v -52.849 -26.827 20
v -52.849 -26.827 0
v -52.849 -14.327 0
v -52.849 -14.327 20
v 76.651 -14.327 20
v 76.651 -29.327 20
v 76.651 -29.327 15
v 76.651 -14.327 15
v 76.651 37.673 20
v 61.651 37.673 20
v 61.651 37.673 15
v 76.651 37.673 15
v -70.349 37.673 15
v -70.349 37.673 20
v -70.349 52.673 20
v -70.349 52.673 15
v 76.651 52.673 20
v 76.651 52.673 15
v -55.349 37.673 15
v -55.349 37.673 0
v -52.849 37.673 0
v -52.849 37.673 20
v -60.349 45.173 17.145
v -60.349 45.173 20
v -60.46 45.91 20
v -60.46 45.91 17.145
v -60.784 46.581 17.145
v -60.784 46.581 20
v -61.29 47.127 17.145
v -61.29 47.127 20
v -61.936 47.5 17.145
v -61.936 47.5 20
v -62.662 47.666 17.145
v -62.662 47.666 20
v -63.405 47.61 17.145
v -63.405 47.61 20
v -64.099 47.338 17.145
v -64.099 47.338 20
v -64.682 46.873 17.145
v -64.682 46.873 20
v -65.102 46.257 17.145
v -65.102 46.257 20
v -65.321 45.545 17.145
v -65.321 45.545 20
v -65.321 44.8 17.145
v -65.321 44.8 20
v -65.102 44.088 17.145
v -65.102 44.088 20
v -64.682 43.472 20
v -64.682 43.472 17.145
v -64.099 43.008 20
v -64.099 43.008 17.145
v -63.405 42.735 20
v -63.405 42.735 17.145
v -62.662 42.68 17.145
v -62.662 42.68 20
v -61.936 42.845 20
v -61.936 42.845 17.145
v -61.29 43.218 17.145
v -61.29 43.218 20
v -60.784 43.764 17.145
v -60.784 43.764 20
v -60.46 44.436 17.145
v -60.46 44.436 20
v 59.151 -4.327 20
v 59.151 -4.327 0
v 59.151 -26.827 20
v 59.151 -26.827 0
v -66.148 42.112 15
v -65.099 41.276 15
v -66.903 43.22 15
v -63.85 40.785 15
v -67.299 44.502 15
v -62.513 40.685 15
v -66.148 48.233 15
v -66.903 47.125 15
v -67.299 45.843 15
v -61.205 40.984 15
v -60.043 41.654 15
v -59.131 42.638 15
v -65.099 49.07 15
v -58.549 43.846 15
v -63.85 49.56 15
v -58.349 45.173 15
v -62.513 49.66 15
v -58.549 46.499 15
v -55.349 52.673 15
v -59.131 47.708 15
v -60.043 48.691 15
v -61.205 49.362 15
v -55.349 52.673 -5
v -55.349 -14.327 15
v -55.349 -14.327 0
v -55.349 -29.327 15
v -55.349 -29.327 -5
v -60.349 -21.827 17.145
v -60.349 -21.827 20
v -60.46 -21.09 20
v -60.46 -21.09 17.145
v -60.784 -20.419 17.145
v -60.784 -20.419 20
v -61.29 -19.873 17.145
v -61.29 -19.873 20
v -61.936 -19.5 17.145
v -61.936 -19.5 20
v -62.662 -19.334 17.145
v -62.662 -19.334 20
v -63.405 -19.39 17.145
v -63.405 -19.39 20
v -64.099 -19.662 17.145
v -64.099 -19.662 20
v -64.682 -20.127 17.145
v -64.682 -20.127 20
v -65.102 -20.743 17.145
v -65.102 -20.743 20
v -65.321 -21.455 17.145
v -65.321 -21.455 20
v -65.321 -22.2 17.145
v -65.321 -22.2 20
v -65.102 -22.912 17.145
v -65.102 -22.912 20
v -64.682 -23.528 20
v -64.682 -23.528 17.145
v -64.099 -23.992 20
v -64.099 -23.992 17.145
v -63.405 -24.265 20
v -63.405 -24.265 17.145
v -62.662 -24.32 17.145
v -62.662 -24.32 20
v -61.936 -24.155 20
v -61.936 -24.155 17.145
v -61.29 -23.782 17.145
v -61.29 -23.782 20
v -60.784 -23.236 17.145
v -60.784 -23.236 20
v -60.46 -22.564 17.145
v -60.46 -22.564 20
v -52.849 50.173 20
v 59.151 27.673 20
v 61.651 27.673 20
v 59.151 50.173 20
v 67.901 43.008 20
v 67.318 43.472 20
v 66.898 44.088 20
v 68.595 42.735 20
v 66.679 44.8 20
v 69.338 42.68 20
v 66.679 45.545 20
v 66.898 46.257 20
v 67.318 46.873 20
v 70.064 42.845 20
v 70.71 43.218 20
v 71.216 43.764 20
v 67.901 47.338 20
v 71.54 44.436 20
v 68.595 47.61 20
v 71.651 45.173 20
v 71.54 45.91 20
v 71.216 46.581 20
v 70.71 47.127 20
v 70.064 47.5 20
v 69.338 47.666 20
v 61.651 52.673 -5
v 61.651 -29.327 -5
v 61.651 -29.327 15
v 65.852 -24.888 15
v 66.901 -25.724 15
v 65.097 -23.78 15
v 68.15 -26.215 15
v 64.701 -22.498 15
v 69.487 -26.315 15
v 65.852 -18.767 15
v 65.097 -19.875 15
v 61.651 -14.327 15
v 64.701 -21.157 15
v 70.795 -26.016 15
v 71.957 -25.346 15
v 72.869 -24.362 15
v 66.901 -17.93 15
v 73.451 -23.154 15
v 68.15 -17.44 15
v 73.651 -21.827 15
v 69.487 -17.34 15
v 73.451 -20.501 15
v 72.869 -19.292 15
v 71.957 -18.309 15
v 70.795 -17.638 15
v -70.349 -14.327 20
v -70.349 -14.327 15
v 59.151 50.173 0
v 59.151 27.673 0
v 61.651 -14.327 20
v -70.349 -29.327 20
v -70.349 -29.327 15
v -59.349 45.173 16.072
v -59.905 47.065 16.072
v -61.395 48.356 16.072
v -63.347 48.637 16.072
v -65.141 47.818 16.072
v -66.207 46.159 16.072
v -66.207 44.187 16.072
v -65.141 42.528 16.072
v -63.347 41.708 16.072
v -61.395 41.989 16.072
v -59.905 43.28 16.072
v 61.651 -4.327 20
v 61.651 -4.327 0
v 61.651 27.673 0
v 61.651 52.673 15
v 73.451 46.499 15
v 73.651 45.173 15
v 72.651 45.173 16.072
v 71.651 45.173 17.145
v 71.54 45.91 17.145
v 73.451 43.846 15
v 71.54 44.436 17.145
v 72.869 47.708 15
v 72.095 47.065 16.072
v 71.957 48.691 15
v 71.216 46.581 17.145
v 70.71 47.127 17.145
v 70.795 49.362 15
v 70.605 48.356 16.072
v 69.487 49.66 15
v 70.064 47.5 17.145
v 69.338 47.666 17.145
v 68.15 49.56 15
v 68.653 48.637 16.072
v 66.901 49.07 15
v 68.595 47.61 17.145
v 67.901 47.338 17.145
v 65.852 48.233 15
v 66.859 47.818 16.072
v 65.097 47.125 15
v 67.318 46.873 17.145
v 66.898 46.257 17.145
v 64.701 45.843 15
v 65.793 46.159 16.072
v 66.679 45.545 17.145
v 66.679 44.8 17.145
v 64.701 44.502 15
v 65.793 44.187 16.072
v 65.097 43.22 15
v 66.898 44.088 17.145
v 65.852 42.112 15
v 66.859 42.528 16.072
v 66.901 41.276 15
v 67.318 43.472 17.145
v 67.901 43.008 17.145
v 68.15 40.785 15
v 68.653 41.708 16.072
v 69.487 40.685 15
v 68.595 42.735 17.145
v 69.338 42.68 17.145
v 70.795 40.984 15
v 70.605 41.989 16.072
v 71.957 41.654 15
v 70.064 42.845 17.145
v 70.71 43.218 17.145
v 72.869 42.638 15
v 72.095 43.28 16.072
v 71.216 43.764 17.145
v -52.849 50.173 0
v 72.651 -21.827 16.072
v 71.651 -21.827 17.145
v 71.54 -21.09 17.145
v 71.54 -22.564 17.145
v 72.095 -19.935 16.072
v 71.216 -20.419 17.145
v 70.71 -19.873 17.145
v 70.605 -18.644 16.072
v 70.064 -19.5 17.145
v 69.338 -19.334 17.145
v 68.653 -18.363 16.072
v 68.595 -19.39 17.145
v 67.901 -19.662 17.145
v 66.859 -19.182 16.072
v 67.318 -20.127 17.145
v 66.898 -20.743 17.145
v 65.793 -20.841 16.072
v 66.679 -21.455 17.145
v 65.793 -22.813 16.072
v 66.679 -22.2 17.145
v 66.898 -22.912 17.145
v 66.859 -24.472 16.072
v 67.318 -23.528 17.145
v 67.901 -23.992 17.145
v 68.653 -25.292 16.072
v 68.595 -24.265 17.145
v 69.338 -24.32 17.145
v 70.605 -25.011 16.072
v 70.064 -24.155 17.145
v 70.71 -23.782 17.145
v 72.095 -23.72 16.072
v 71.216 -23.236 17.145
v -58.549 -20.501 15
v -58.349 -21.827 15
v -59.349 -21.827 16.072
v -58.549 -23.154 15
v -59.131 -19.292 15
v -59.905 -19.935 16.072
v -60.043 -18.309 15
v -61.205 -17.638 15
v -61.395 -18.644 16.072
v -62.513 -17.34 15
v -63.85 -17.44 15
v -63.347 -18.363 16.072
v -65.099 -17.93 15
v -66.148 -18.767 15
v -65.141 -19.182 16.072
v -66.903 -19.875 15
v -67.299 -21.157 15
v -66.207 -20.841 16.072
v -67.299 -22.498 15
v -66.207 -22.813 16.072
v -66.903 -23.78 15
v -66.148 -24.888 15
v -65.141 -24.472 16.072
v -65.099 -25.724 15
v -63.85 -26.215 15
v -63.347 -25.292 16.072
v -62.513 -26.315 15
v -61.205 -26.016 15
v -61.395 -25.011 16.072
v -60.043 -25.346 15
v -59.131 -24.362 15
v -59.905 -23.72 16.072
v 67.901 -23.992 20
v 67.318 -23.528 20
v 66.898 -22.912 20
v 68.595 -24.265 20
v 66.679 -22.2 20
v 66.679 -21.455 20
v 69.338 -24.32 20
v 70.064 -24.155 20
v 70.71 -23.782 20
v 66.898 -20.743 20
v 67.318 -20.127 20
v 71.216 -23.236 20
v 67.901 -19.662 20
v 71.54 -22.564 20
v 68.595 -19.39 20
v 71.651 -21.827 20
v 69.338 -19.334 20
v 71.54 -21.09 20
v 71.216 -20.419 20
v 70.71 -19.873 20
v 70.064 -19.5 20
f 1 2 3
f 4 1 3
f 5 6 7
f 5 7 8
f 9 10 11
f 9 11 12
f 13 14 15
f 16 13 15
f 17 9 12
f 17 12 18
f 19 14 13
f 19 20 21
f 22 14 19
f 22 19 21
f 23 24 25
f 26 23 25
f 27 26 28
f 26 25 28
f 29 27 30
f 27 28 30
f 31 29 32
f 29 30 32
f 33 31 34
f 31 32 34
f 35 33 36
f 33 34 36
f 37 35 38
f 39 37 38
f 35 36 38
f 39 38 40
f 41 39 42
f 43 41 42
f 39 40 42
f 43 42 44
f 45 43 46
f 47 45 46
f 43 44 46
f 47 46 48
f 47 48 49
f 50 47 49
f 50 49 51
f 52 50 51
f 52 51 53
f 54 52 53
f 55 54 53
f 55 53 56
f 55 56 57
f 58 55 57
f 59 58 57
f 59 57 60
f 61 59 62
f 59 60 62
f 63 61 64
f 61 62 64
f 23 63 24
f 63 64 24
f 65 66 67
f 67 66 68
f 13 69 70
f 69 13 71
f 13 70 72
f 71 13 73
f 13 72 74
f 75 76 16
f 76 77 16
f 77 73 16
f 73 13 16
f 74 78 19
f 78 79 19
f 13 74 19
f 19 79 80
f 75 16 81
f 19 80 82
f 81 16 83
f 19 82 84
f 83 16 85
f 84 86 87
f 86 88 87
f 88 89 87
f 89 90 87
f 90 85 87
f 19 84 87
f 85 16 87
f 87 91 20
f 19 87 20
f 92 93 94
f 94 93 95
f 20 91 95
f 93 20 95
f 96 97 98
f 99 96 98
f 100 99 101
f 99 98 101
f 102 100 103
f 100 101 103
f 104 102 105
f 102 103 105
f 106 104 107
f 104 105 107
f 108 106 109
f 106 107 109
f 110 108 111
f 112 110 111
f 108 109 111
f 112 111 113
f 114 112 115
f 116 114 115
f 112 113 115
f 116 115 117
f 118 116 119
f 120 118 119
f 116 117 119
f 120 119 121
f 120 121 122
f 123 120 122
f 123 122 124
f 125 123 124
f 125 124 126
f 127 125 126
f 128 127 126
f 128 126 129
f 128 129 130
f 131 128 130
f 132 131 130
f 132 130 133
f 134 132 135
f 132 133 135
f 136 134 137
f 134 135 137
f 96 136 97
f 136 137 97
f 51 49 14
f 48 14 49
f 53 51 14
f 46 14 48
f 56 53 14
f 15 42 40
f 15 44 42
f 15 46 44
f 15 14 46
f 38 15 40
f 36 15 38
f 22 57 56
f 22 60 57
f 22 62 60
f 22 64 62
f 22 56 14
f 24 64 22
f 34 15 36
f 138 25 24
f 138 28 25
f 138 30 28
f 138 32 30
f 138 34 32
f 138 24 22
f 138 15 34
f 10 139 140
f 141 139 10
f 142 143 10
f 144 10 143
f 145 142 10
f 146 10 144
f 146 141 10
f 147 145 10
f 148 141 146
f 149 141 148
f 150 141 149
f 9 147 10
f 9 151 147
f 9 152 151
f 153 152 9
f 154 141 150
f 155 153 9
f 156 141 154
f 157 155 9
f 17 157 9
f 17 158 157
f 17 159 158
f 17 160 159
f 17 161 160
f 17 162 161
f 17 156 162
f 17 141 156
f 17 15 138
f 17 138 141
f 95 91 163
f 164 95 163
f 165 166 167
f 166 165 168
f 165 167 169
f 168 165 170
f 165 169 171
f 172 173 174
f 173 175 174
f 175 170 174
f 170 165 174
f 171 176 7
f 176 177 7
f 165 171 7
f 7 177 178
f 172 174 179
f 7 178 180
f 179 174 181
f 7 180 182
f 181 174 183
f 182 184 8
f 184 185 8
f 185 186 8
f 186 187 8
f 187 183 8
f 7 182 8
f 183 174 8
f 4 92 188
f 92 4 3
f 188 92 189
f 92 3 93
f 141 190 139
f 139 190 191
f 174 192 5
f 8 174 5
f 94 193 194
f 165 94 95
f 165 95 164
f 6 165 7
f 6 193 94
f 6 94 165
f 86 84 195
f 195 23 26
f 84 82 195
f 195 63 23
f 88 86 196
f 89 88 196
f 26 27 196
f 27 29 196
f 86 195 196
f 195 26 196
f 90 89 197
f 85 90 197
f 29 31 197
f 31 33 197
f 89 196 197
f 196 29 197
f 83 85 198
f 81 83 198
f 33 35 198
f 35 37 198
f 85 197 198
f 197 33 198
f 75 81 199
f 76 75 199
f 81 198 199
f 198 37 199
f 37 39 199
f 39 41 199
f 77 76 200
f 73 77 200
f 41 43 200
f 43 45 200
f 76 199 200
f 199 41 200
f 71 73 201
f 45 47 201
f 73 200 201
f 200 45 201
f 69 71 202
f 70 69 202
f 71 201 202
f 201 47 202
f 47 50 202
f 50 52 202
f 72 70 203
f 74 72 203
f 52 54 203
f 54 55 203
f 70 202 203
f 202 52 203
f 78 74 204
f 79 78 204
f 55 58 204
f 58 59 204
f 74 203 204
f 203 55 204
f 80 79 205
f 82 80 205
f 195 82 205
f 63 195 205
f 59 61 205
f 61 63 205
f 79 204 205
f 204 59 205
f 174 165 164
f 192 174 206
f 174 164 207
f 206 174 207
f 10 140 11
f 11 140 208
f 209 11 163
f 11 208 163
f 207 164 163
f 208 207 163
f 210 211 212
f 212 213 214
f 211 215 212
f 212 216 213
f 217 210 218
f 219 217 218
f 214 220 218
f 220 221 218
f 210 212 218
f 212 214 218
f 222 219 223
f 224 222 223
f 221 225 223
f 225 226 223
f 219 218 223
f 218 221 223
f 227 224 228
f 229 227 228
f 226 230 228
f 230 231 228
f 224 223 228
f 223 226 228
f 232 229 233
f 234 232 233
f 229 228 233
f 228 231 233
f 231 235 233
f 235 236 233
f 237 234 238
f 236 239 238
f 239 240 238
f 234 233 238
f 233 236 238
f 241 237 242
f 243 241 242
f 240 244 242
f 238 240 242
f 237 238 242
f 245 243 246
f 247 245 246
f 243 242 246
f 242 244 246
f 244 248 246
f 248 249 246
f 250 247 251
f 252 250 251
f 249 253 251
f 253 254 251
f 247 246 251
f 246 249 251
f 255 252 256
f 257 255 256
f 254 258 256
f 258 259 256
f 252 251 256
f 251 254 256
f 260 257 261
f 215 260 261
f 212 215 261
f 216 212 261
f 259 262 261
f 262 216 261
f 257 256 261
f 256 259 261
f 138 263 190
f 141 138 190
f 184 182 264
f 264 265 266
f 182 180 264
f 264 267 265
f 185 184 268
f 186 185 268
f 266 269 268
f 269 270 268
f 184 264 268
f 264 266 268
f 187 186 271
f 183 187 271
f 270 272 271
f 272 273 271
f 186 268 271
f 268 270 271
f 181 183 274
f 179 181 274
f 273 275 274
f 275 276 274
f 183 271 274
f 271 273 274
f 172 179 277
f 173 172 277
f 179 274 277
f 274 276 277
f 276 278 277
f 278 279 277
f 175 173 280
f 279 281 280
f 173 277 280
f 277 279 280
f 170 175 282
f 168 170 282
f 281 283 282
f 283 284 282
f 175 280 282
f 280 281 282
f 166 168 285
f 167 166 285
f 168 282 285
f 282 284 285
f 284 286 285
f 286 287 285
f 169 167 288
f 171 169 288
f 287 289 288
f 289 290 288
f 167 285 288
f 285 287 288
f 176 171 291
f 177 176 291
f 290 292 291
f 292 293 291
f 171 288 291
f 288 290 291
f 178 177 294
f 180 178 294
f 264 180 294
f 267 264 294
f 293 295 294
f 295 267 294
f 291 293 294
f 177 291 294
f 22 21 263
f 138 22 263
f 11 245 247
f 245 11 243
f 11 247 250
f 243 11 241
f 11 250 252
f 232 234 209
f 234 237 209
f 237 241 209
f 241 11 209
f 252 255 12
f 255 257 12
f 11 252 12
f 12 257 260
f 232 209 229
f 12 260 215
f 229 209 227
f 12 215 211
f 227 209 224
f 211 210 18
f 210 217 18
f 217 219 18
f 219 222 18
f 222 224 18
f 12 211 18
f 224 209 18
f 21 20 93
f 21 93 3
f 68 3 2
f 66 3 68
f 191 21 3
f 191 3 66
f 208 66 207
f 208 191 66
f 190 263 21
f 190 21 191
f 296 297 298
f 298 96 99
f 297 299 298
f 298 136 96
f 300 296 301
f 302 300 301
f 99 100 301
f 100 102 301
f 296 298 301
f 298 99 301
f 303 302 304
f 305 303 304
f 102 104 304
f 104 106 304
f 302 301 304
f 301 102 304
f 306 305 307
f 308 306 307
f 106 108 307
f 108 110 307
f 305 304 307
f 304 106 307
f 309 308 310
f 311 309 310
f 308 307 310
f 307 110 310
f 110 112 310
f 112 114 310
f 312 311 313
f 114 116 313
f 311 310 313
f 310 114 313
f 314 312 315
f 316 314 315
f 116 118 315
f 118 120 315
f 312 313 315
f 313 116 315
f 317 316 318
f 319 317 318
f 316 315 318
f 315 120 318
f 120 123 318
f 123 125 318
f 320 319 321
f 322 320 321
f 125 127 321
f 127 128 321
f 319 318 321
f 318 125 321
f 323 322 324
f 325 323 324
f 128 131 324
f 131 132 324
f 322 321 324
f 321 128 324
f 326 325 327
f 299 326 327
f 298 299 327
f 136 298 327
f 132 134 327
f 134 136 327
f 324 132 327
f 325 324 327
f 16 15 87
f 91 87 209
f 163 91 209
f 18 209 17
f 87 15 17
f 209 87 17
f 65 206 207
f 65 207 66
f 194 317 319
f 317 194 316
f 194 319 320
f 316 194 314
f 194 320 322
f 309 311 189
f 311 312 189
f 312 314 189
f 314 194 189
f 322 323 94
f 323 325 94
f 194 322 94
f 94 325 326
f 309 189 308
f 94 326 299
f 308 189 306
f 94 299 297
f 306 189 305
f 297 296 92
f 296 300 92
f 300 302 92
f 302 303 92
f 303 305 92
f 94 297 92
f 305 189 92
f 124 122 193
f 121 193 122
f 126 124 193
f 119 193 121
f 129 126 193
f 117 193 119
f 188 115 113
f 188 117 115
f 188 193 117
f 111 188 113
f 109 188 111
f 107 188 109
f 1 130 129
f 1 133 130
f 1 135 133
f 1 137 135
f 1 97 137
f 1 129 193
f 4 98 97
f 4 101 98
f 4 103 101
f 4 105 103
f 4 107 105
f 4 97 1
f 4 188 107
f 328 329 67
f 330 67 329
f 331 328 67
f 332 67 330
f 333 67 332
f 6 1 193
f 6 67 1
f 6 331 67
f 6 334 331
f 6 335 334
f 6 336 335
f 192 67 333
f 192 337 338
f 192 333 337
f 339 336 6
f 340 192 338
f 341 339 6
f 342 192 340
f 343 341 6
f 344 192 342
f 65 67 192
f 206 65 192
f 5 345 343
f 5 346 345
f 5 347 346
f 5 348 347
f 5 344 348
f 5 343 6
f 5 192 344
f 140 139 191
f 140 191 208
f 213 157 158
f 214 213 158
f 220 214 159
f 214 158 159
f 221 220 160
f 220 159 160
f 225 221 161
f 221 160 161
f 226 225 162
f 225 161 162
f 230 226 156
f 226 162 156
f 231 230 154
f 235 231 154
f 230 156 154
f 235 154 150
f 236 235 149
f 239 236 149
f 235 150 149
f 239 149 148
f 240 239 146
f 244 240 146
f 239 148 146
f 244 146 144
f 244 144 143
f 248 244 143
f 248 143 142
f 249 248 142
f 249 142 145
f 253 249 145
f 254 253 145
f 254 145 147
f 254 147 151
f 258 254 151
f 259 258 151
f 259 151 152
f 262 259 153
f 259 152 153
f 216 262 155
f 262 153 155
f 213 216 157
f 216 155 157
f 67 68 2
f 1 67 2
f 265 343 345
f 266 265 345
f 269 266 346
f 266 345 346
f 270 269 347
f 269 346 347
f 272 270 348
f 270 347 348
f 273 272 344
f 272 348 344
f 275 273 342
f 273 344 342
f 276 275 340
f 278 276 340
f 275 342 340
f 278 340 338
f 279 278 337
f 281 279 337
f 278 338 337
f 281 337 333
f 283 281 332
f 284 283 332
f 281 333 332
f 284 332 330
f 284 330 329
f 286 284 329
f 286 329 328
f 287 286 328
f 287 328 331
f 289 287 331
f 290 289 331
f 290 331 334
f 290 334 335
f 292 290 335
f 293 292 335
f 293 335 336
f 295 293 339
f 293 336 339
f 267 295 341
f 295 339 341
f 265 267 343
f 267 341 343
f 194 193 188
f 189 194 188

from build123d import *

# Parameters (mm, degrees)
F0_W       = 2.5
F0_H       = 32
F0_H_2     = 52
F1_DEPTH   = 5
F2_DEPTH   = 20
F3_W       = 15
F3_H       = 15
F3_R       = 2.5
F4_W       = 15
F4_H       = 15
F4_R       = 2.5
F5_DEPTH   = 5
F6_SIZE2   = 2.14473742
F6_SIZE    = 2
F7_SIZE2   = 2.14473742
F7_SIZE    = 2
F8_SIZE2   = 2.14473742
F8_SIZE    = 2
F8_2_SIZE2 = 2.14473742
F8_2_SIZE  = 2


with BuildPart() as f1:
    # F0 (on Top) → F1 (new body)
    with BuildSketch(Plane.XY):
        Polygon((61.6508859247, 52.6726719439), (-55.3491140753, 52.6726719439), (-55.3491140753, 37.6726719439), (-52.8491140753, 37.6726719439), (-52.8491140753, 50.1726719439), (59.1508859247, 50.1726719439), (59.1508859247, 27.6726719439), (61.6508859247, 27.6726719439), align=None)
        Polygon((-52.8491140753, 50.1726719439), (-52.8491140753, 37.6726719439), (-52.8491140753, -14.3273280561), (-52.8491140753, -26.8273280561), (59.1508859247, -26.8273280561), (59.1508859247, -4.3273280561), (59.1508859247, 27.6726719439), (59.1508859247, 50.1726719439), align=None)
        with Locations((60.4008859247, 11.6726719439)):
            Rectangle(F0_W, F0_H)
        Polygon((-52.8491140753, -14.3273280561), (-55.3491140753, -14.3273280561), (-55.3491140753, -29.3273280561), (61.6508859247, -29.3273280561), (61.6508859247, -4.3273280561), (59.1508859247, -4.3273280561), (59.1508859247, -26.8273280561), (-52.8491140753, -26.8273280561), align=None)
        with Locations((-54.0991140753, 11.6726719439)):
            Rectangle(F0_W, F0_H_2)
    extrude(amount=-F1_DEPTH)

    # F0 (on Top) → F2 (join)
    with BuildSketch(Plane.XY):
        Polygon((61.6508859247, 52.6726719439), (-55.3491140753, 52.6726719439), (-55.3491140753, 37.6726719439), (-52.8491140753, 37.6726719439), (-52.8491140753, 50.1726719439), (59.1508859247, 50.1726719439), (59.1508859247, 27.6726719439), (61.6508859247, 27.6726719439), align=None)
        Polygon((-52.8491140753, -14.3273280561), (-55.3491140753, -14.3273280561), (-55.3491140753, -29.3273280561), (61.6508859247, -29.3273280561), (61.6508859247, -4.3273280561), (59.1508859247, -4.3273280561), (59.1508859247, -26.8273280561), (-52.8491140753, -26.8273280561), align=None)
    extrude(amount=F2_DEPTH)

    # F3 (on face) + F4 (on face) → F5 (join)
    with BuildSketch(Plane.XY.offset(20)):
        with Locations((-62.8491140753, 45.1726719439)):
            Rectangle(F3_W, F3_H)
        with Locations((-62.8491140753, 45.1726719439)):
            Circle(F3_R, mode=Mode.SUBTRACT)
        with Locations((69.1508859247, 45.1726719439)):
            Rectangle(F3_W, F3_H)
        with Locations((69.1508859247, 45.1726719439)):
            Circle(F3_R, mode=Mode.SUBTRACT)
    with BuildSketch(Plane.XY.offset(20)):
        with Locations((-62.8491140753, -21.8273280561)):
            Rectangle(F4_W, F4_H)
        with Locations((-62.8491140753, -21.8273280561)):
            Circle(F4_R, mode=Mode.SUBTRACT)
        with Locations((69.1508859247, -21.8273280561)):
            Rectangle(F4_W, F4_H)
        with Locations((69.1508859247, -21.8273280561)):
            Circle(F4_R, mode=Mode.SUBTRACT)
    extrude(amount=-F5_DEPTH)

    # F6
    f6_edges = [f1.edges().sort_by_distance(p)[0] for p in [
        (66.650886, -21.827328, 15),
    ]]
    f6_side = f1.faces().sort_by_distance((76.438754, -21.827328, 15))[0]
    chamfer(f6_edges, length=F6_SIZE, length2=F6_SIZE2, reference=f6_side)

    # F7
    f7_edges = [f1.edges().sort_by_distance(p)[0] for p in [
        (66.650886, 45.172672, 15),
    ]]
    f7_side = f1.faces().sort_by_distance((69.150886, 52.46054, 15))[0]
    chamfer(f7_edges, length=F7_SIZE, length2=F7_SIZE2, reference=f7_side)

    # F8
    f8_edges = [f1.edges().sort_by_distance(p)[0] for p in [
        (-65.349114, -21.827328, 15),
    ]]
    f8_side = f1.faces().sort_by_distance((-62.849114, -29.115196, 15))[0]
    chamfer(f8_edges, length=F8_SIZE, length2=F8_SIZE2, reference=f8_side)

    # F8#2
    f8_2_edges = [f1.edges().sort_by_distance(p)[0] for p in [
        (-65.349114, 45.172672, 15),
    ]]
    f8_2_side = f1.faces().sort_by_distance((-62.849114, 37.884804, 15))[0]
    chamfer(f8_2_edges, length=F8_2_SIZE, length2=F8_2_SIZE2, reference=f8_2_side)


solid = f1.part
